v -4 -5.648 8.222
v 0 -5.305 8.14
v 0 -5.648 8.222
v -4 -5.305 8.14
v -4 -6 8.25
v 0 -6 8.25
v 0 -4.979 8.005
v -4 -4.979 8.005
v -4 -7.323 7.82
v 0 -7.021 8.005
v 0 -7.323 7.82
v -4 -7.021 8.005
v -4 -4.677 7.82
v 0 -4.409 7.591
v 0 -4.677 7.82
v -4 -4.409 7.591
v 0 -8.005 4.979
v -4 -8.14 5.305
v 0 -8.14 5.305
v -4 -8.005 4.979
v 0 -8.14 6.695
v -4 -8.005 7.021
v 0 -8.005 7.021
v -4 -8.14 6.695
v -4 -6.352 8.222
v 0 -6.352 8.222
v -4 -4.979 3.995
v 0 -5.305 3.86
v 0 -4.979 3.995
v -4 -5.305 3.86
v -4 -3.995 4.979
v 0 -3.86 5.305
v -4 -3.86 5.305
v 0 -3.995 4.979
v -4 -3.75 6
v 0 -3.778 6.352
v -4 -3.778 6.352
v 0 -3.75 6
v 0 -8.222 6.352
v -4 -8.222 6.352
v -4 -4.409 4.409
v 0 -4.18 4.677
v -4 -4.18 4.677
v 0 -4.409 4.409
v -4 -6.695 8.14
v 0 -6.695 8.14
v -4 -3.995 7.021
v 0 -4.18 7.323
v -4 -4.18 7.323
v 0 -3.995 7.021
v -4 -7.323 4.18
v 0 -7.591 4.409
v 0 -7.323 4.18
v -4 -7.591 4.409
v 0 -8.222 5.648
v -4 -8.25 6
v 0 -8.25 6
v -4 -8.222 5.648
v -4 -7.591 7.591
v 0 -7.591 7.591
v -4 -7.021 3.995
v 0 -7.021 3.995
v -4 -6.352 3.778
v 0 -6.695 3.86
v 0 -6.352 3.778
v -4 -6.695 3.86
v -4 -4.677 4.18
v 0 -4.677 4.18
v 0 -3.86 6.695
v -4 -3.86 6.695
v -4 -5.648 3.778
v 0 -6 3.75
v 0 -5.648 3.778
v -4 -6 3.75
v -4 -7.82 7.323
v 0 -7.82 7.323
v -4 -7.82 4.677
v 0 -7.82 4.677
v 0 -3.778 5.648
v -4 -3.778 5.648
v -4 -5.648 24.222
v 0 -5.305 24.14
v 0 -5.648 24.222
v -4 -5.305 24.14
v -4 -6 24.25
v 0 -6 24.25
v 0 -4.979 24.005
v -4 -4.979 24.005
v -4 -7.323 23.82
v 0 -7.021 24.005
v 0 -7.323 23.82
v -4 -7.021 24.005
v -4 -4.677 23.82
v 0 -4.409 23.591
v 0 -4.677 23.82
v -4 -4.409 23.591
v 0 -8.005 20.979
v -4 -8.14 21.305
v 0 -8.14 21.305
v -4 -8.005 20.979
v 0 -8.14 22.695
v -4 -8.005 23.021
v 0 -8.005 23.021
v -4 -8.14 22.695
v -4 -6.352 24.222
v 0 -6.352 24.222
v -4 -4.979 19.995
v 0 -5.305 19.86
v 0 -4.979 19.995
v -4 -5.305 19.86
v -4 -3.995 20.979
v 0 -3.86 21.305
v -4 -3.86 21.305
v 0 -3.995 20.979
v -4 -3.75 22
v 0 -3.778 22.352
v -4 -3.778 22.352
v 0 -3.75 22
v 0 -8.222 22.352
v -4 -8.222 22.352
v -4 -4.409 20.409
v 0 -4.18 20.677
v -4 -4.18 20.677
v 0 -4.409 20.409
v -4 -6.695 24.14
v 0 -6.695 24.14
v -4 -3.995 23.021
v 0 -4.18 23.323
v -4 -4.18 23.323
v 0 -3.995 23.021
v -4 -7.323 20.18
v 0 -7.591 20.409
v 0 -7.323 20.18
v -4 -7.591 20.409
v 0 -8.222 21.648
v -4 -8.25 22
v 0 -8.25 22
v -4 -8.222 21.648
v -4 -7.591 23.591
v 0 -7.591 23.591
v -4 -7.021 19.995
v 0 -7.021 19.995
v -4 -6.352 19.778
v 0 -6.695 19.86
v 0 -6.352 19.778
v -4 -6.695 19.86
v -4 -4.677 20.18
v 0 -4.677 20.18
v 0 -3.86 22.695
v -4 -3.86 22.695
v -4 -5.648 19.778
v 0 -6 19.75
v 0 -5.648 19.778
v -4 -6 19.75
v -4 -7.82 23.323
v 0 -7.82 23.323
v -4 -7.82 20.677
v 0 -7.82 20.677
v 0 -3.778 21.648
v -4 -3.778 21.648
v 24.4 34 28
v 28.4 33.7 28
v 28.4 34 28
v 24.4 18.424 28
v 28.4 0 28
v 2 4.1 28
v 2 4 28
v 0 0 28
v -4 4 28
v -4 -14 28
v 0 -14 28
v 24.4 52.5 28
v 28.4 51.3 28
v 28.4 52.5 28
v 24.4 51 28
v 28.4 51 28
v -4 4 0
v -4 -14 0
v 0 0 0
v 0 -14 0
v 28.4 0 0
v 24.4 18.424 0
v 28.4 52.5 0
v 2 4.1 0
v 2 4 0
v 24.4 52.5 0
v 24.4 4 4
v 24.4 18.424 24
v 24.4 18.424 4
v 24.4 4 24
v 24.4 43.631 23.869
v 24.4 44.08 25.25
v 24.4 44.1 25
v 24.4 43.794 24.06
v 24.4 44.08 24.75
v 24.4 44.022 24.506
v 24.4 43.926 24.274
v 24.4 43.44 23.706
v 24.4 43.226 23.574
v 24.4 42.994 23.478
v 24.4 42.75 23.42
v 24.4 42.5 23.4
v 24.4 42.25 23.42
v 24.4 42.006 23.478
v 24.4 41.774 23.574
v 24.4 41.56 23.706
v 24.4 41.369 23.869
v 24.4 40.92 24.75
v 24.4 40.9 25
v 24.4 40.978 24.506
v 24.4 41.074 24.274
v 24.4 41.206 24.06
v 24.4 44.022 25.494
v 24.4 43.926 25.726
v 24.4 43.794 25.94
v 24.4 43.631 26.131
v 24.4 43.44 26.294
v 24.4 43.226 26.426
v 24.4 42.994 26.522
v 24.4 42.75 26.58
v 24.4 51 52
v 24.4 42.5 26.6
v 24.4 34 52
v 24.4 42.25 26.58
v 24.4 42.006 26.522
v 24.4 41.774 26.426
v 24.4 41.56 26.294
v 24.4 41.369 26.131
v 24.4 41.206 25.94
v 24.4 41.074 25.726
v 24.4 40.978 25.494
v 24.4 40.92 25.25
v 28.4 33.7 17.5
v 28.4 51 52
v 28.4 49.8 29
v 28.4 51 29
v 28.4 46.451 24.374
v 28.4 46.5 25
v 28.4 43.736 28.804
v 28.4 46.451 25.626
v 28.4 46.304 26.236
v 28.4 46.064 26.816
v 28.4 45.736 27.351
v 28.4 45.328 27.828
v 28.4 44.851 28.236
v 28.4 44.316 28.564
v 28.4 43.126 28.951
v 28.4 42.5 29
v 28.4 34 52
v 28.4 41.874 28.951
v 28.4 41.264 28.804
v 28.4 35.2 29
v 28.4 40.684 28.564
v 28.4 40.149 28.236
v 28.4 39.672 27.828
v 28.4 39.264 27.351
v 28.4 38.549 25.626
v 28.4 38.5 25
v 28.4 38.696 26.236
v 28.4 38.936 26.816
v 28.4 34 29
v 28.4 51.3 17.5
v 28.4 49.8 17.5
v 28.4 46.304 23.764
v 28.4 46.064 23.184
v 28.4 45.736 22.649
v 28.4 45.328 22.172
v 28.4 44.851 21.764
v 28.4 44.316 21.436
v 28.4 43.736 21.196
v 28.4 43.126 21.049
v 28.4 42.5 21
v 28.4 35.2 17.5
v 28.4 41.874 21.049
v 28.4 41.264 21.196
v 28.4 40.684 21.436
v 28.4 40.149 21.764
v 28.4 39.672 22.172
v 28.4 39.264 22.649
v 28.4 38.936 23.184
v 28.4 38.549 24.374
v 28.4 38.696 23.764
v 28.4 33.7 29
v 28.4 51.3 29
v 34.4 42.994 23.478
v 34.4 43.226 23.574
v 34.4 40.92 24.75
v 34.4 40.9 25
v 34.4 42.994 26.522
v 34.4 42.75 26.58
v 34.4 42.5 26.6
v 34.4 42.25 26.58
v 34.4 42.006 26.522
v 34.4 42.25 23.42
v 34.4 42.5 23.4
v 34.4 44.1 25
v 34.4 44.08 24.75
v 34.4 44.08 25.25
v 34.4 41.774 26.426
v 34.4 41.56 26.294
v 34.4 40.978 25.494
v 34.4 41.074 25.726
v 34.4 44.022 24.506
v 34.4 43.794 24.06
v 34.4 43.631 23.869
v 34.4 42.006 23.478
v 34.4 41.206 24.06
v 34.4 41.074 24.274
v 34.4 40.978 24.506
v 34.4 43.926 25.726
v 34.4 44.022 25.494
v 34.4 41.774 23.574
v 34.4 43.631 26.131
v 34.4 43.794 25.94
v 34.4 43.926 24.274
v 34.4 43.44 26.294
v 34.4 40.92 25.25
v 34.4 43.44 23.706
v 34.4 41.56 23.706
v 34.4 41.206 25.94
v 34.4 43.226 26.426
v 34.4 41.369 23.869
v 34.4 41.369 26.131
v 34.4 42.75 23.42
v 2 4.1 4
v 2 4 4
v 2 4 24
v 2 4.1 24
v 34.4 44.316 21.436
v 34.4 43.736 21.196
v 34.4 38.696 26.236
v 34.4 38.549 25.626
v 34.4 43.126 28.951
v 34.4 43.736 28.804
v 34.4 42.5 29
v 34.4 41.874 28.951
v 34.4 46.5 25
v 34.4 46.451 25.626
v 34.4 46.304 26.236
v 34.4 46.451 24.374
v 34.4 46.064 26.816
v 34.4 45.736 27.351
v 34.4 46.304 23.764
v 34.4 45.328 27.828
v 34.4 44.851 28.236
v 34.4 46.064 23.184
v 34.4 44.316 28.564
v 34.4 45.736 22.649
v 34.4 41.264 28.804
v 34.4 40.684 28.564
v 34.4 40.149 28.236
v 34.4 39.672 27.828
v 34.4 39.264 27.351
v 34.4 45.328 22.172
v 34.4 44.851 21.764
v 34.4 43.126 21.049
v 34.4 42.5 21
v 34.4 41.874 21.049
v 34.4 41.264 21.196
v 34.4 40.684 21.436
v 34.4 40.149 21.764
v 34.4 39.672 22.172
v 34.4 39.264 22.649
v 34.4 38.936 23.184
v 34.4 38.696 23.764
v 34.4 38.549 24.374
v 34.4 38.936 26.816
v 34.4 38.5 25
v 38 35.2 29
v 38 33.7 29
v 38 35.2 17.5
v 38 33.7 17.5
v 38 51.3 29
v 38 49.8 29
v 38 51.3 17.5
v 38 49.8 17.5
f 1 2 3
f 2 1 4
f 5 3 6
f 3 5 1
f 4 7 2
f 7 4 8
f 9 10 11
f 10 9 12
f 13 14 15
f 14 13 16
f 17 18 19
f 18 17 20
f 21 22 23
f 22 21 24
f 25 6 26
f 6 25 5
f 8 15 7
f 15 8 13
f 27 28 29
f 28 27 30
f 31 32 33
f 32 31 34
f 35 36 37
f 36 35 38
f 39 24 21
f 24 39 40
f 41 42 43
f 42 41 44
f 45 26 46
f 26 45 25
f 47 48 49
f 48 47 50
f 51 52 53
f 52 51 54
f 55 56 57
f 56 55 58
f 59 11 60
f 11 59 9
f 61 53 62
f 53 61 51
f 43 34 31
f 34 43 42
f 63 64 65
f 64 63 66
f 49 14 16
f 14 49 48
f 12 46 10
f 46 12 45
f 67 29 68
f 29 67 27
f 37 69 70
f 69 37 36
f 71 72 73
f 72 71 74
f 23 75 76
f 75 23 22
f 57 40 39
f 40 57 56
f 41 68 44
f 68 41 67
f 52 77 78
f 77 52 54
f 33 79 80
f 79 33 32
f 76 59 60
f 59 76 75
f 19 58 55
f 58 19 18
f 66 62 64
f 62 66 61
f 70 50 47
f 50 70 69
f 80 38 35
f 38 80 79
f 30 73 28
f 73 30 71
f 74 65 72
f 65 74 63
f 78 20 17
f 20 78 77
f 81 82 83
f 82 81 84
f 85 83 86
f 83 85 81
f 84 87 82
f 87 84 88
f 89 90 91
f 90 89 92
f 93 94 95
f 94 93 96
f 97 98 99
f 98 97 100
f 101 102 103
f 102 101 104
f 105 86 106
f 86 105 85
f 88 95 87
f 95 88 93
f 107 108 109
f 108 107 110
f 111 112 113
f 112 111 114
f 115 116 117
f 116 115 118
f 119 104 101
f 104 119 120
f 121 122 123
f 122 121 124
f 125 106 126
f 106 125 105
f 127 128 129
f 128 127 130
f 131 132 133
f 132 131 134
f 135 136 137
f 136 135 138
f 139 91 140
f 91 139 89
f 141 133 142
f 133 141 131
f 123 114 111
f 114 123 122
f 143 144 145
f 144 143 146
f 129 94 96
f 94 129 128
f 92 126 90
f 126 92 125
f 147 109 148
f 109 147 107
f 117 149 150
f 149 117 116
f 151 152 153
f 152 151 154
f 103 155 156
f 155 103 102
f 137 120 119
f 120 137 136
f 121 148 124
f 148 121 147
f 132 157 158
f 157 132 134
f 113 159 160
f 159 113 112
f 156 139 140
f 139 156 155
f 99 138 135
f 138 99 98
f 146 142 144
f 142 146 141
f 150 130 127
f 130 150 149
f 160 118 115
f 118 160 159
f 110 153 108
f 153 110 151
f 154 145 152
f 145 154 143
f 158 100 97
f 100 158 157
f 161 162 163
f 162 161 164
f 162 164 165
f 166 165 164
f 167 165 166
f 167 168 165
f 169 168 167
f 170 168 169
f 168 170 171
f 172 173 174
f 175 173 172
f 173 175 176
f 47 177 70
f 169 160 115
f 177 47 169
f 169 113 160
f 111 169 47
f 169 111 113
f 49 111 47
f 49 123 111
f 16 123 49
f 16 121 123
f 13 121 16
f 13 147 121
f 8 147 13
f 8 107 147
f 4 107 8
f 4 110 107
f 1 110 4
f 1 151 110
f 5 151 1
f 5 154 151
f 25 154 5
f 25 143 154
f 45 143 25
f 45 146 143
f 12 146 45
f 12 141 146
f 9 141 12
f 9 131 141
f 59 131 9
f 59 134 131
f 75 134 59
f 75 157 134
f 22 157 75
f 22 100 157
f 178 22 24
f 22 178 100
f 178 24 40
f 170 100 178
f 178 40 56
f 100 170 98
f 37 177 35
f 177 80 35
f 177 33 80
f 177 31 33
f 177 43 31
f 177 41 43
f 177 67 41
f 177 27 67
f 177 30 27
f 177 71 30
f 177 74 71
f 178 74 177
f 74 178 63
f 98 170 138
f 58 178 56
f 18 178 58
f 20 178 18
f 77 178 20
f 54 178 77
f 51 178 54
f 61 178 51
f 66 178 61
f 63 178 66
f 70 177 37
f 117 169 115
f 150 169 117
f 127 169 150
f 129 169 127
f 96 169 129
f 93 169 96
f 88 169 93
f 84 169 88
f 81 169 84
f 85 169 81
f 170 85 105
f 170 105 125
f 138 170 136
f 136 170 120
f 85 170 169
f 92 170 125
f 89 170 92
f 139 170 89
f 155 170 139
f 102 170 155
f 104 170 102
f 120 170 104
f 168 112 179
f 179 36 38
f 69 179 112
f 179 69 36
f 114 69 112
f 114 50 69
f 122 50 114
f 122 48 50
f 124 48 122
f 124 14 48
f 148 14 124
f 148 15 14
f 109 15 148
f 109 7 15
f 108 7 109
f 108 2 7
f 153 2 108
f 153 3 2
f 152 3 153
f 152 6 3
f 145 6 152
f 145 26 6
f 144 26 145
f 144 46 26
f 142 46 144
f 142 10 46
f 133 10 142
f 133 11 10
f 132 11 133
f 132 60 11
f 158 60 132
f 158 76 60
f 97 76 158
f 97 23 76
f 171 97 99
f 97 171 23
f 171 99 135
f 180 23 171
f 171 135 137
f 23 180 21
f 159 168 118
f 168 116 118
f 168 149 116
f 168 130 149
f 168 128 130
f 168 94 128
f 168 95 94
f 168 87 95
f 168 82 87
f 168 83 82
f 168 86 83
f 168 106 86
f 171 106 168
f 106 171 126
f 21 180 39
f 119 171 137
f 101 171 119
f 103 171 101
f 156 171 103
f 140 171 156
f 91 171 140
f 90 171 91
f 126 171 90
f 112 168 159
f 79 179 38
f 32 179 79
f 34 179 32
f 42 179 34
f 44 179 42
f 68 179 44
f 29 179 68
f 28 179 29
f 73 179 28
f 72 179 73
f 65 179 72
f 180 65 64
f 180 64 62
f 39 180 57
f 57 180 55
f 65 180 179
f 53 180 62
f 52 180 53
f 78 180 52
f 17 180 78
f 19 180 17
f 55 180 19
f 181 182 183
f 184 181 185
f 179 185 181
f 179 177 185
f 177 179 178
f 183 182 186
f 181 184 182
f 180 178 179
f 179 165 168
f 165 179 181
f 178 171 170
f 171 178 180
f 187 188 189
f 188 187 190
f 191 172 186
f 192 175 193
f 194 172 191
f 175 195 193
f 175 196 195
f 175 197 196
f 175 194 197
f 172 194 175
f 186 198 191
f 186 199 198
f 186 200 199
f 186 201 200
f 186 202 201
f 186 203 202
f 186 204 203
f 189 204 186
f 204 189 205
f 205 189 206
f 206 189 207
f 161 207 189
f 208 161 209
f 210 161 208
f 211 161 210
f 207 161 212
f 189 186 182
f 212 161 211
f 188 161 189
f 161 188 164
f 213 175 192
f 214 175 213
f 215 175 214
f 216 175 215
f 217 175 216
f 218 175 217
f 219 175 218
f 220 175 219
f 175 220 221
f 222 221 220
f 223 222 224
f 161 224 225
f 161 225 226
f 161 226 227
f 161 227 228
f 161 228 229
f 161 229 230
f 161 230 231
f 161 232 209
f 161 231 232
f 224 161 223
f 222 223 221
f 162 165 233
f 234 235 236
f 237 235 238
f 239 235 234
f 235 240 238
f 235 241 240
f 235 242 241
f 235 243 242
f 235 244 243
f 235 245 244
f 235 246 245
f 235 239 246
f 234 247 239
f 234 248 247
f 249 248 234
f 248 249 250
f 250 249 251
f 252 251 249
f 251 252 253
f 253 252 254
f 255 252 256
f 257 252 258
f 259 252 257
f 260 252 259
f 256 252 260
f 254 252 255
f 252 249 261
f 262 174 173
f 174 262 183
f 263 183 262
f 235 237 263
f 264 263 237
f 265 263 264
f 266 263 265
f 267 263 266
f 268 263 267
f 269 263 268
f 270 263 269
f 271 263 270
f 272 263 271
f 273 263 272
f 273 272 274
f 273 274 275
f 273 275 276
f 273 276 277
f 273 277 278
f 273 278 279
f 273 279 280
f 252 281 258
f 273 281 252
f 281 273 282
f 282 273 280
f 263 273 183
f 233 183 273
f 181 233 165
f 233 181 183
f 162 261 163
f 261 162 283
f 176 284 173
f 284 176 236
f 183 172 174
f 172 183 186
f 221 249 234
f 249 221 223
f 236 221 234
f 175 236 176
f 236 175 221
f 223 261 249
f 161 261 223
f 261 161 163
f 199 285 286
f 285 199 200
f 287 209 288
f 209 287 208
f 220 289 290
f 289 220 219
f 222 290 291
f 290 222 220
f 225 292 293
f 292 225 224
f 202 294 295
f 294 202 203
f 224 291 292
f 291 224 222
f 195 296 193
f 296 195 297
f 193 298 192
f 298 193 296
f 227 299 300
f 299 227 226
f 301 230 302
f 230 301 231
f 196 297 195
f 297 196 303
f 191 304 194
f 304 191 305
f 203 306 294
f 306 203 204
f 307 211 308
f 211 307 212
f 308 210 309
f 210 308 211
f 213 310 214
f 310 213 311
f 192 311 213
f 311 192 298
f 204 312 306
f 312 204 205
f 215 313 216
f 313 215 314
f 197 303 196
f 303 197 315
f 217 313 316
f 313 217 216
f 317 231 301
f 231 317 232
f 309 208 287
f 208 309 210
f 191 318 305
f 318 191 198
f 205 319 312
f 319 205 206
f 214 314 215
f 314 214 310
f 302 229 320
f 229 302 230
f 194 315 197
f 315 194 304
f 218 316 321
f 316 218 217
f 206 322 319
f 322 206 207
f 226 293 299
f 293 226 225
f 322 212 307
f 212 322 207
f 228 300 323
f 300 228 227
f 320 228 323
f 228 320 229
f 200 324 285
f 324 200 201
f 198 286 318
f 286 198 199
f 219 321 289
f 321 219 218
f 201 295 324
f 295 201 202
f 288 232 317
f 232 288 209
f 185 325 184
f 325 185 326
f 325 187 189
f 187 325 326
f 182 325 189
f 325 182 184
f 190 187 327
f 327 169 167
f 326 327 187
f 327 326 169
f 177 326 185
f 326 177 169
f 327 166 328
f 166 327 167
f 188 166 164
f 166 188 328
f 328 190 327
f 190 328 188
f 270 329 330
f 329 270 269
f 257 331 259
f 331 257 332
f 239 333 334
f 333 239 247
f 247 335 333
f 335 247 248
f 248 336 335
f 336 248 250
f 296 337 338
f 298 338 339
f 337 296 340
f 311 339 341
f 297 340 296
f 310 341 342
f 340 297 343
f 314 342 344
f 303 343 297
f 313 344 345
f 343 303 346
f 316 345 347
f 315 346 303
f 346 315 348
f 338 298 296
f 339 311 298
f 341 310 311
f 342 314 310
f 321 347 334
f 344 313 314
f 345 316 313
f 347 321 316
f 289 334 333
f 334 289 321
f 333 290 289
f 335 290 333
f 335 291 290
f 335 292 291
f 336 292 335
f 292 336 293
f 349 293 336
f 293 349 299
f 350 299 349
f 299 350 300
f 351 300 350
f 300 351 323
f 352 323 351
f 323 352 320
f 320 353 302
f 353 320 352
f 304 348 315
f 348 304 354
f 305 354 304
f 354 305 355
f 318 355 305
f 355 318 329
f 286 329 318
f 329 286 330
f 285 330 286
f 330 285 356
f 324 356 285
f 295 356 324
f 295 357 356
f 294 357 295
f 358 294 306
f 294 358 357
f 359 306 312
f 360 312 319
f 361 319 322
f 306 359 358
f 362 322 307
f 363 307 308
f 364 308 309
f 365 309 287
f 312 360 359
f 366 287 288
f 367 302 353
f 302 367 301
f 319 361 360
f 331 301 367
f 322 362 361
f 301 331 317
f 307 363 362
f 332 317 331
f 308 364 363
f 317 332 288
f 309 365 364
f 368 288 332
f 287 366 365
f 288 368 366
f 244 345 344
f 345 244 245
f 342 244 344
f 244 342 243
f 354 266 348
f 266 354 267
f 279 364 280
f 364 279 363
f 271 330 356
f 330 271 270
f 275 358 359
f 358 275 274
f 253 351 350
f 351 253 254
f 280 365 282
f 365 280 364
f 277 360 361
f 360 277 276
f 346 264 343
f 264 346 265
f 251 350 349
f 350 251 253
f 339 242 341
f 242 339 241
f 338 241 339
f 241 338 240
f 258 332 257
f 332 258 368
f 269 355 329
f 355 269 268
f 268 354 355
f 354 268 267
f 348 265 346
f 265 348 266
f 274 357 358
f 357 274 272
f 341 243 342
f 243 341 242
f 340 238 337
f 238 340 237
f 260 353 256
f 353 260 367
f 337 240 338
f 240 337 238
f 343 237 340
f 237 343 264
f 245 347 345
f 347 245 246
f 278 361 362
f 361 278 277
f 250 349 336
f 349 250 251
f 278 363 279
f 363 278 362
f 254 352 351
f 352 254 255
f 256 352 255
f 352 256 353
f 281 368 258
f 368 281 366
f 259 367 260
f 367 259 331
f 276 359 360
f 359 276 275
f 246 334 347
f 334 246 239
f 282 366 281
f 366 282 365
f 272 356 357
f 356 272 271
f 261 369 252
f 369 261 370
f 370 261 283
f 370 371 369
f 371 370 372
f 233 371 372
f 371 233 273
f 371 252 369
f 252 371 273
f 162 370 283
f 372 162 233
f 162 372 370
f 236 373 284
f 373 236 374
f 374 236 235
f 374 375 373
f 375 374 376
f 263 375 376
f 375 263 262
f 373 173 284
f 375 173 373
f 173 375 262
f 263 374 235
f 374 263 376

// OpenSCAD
// Cliff sensor mount (one per side, mirrored): hangs an HW-870 / TCRT5000
// reflectance module ahead of a front wheel, sensor face a few mm above the
// bench, from the end holes of the front cross beam.
//
// Shape: an L. A foot bolts to the beam's TOP face through two M4 holes of
// one row (16 mm apart along the beam). A plate drops down in front of the
// beam's front face, and a shelf at the bottom carries the sensor module
// underneath it: component side (pot, chip, header solder joints) up
// against a 6 mm boss around the M3 screw, so nothing but the boss touches,
// sensor side down. Pins point rearward (toward the beam), the TCRT5000
// end forward, ahead of the wheel.
//
// Frame: X along the beam (outboard = +X for the right-hand part), +Y
// forward, +Z up. Origin: the beam's top-front edge at the foot's inboard
// end. `side = "right"` / `"left"` mirrors.
//
// Print: on its side (see print_orient), no supports, no brim.
//
// Render:  openscad -D side=\"right\" -o cliff-mount-right.stl cliff-mount.scad
//          openscad -D side=\"left\"  -o cliff-mount-left.stl  cliff-mount.scad

side = "right";

// ---- Beam (Makeblock 0824 flat; MEASURE) ----------------------------------
beam_top_h   = 51;    // beam top face above the bench, mm (Enoch, 2026-10-03)
beam_depth   = 24;    // top face, front-to-back
hole_pitch   = 16;    // along the beam, within one row
hole_row_y   = -6;    // row centreline from the front edge (front row); back row ~ -18
m4_hole      = 4.5;

// ---- Sensor module (HW-870; MEASURE) ---------------------------------------
pcb_l        = 31.5;  // measured (Enoch, 2026-10-03); along Y when mounted, pins at the rear
pcb_w        = 14;
pcb_hole_d   = 3.2;   // M3 clearance
pcb_hole_in  = 7.5;   // hole centre from the pin-end edge (near edge at 6 mm, Enoch)
boss_h       = 6;     // spacer: clears the pot (~5 mm) and solder tails
boss_d       = 8;
sensor_face_h = 8;    // target: sensor face above the bench (TCRT5000 likes 2-10 mm)
pcb_t        = 1.6;
tcrt_h       = 7;     // TCRT5000 body height below the PCB (sensor side)

// ---- Bracket ----------------------------------------------------------------
foot_l   = hole_pitch + 12;   // along X
foot_w   = 14;                // along Y (sits on the top face)
foot_t   = 4;
plate_t  = 4;                 // drop plate (Y)
plate_w  = foot_l;            // X
shelf_t  = 3;
shelf_y  = pcb_l + 2;         // forward reach of the shelf
// shelf underside height so the sensor face lands at sensor_face_h:
shelf_bot_z = -(beam_top_h - (sensor_face_h + tcrt_h + pcb_t + boss_h));
drop_h   = -shelf_bot_z + shelf_t;   // plate from beam top down to shelf top

$fn = 40;

// ---- v4 (2026-10-04): sensor in front of its wheel ---------------------
// v3 put the sensor 31 mm inboard of the tyre centreline and 54 mm ahead
// of the axle (Enoch's measurements); an angled approach could put the
// tyre over the edge first. v4 moves the TCRT5000 onto the tyre
// centreline (+31 mm outboard) and ~65 mm ahead of the axle. The PCB now
// lies across the robot (along X), pins pointing inboard, so neither the
// board nor its connector reaches back into the tyre.
axle_y      = -22.5;  // axle centre relative to the beam's top-front edge (54 mm lead measured)
tyre_r      = 35;     // ~70 mm wheels (Enoch, 2026-10-04)
tyre_w      = 26;
sensor_x    = plate_w / 2 + 31;  // tyre centreline
sensor_lead = 65;     // TCRT5000 centre ahead of the axle
tcrt_in     = 4;      // TCRT5000 centre from the PCB's sensor-end edge
sensor_y    = axle_y + sensor_lead;
pcb_x1      = sensor_x + tcrt_in;          // sensor-end edge (outboard)
pcb_x0      = pcb_x1 - pcb_l;              // pin-end edge (inboard)
hole_x      = pcb_x0 + pcb_hole_in;
shelf_x1    = pcb_x1 + 3;
shelf_y1    = sensor_y + pcb_w / 2 + 3;
// tyre front at shelf height, plus clearance: no shelf outboard of the
// tyre's inner face behind this line
tyre_in_x   = sensor_x - tyre_w / 2 - 2;
h_shelf     = beam_top_h + shelf_bot_z;    // shelf underside above the bench
tyre_clear_y = axle_y + sqrt(tyre_r * tyre_r - pow(tyre_r - h_shelf, 2)) + 4;

module part() {
  // foot on the beam's top face
  difference() {
    translate([0, -foot_w, 0]) cube([foot_l, foot_w, foot_t]);
    for (i = [0, 1]) translate([6 + i * hole_pitch, hole_row_y, -1]) cylinder(d = m4_hole, h = foot_t + 2);
  }
  // drop plate in front of the beam's front face
  translate([0, 0, shelf_bot_z]) cube([plate_w, plate_t, foot_t - shelf_bot_z]);
  // shelf: an inboard spine (plate width, clear of the tyre) carrying the
  // screw, boss and ribs, plus a narrow arm out over the sensor end of the
  // PCB - nothing else sits in front of the tyre (Enoch's suggestion).
  arm_w = pcb_w + 3;
  difference() {
    union() {
      translate([0, 0, shelf_bot_z]) cube([plate_w, shelf_y1, shelf_t + 1]);
      translate([plate_w - 2, sensor_y - arm_w / 2, shelf_bot_z]) cube([shelf_x1 - plate_w + 2, arm_w, shelf_t + 1]);
    }
    translate([hole_x, sensor_y, shelf_bot_z - 1]) cylinder(d = pcb_hole_d, h = shelf_t + 3);
  }
  // braces: drop plate to shelf top
  for (x = [0, plate_w - 4]) hull() {
    translate([x, plate_t, shelf_bot_z + shelf_t]) cube([4, 0.1, -shelf_bot_z - shelf_t - 2]);
    translate([x, 18, shelf_bot_z + shelf_t]) cube([4, 1, 0.1]);
  }
  // spacer boss under the screw
  difference() {
    translate([hole_x, sensor_y, shelf_bot_z - boss_h]) cylinder(d = boss_d, h = boss_h);
    translate([hole_x, sensor_y, shelf_bot_z - boss_h - 1]) cylinder(d = pcb_hole_d, h = boss_h + 2);
  }
  // side ribs along both long PCB edges (now front/back), from the pin end
  // to 4 mm past the screw, reaching below the board
  rib_l = pcb_hole_in + 4;
  rib_h = boss_h + pcb_t + 2;
  rib_gap = 0.3;
  for (dy = [-(pcb_w / 2 + rib_gap + 1.5), pcb_w / 2 + rib_gap])
    translate([pcb_x0, sensor_y + dy, shelf_bot_z - rib_h]) cube([rib_l, 1.5, rib_h]);
}

module tyre_ghost() {
  translate([sensor_x, axle_y, -beam_top_h + tyre_r]) rotate([0, 90, 0]) cylinder(r = tyre_r, h = tyre_w, center = true);
}

module pcb_ghost() {
  translate([pcb_x0, sensor_y - pcb_w / 2, shelf_bot_z - boss_h - pcb_t]) cube([pcb_l, pcb_w, pcb_t]);
}

// Print orientation: on its SIDE (the L profile extruded upward along X), so
// the foot and shelf are both flat on the bed's plane - no overhangs.
print_orient = true;
module oriented() { if (side == "left") mirror([1, 0, 0]) part(); else part(); }
if (print_orient) { if (side == "left") rotate([0, 90, 0]) oriented(); else rotate([0, -90, 0]) oriented(); }
else { oriented(); %pcb_ghost(); %tyre_ghost(); }
